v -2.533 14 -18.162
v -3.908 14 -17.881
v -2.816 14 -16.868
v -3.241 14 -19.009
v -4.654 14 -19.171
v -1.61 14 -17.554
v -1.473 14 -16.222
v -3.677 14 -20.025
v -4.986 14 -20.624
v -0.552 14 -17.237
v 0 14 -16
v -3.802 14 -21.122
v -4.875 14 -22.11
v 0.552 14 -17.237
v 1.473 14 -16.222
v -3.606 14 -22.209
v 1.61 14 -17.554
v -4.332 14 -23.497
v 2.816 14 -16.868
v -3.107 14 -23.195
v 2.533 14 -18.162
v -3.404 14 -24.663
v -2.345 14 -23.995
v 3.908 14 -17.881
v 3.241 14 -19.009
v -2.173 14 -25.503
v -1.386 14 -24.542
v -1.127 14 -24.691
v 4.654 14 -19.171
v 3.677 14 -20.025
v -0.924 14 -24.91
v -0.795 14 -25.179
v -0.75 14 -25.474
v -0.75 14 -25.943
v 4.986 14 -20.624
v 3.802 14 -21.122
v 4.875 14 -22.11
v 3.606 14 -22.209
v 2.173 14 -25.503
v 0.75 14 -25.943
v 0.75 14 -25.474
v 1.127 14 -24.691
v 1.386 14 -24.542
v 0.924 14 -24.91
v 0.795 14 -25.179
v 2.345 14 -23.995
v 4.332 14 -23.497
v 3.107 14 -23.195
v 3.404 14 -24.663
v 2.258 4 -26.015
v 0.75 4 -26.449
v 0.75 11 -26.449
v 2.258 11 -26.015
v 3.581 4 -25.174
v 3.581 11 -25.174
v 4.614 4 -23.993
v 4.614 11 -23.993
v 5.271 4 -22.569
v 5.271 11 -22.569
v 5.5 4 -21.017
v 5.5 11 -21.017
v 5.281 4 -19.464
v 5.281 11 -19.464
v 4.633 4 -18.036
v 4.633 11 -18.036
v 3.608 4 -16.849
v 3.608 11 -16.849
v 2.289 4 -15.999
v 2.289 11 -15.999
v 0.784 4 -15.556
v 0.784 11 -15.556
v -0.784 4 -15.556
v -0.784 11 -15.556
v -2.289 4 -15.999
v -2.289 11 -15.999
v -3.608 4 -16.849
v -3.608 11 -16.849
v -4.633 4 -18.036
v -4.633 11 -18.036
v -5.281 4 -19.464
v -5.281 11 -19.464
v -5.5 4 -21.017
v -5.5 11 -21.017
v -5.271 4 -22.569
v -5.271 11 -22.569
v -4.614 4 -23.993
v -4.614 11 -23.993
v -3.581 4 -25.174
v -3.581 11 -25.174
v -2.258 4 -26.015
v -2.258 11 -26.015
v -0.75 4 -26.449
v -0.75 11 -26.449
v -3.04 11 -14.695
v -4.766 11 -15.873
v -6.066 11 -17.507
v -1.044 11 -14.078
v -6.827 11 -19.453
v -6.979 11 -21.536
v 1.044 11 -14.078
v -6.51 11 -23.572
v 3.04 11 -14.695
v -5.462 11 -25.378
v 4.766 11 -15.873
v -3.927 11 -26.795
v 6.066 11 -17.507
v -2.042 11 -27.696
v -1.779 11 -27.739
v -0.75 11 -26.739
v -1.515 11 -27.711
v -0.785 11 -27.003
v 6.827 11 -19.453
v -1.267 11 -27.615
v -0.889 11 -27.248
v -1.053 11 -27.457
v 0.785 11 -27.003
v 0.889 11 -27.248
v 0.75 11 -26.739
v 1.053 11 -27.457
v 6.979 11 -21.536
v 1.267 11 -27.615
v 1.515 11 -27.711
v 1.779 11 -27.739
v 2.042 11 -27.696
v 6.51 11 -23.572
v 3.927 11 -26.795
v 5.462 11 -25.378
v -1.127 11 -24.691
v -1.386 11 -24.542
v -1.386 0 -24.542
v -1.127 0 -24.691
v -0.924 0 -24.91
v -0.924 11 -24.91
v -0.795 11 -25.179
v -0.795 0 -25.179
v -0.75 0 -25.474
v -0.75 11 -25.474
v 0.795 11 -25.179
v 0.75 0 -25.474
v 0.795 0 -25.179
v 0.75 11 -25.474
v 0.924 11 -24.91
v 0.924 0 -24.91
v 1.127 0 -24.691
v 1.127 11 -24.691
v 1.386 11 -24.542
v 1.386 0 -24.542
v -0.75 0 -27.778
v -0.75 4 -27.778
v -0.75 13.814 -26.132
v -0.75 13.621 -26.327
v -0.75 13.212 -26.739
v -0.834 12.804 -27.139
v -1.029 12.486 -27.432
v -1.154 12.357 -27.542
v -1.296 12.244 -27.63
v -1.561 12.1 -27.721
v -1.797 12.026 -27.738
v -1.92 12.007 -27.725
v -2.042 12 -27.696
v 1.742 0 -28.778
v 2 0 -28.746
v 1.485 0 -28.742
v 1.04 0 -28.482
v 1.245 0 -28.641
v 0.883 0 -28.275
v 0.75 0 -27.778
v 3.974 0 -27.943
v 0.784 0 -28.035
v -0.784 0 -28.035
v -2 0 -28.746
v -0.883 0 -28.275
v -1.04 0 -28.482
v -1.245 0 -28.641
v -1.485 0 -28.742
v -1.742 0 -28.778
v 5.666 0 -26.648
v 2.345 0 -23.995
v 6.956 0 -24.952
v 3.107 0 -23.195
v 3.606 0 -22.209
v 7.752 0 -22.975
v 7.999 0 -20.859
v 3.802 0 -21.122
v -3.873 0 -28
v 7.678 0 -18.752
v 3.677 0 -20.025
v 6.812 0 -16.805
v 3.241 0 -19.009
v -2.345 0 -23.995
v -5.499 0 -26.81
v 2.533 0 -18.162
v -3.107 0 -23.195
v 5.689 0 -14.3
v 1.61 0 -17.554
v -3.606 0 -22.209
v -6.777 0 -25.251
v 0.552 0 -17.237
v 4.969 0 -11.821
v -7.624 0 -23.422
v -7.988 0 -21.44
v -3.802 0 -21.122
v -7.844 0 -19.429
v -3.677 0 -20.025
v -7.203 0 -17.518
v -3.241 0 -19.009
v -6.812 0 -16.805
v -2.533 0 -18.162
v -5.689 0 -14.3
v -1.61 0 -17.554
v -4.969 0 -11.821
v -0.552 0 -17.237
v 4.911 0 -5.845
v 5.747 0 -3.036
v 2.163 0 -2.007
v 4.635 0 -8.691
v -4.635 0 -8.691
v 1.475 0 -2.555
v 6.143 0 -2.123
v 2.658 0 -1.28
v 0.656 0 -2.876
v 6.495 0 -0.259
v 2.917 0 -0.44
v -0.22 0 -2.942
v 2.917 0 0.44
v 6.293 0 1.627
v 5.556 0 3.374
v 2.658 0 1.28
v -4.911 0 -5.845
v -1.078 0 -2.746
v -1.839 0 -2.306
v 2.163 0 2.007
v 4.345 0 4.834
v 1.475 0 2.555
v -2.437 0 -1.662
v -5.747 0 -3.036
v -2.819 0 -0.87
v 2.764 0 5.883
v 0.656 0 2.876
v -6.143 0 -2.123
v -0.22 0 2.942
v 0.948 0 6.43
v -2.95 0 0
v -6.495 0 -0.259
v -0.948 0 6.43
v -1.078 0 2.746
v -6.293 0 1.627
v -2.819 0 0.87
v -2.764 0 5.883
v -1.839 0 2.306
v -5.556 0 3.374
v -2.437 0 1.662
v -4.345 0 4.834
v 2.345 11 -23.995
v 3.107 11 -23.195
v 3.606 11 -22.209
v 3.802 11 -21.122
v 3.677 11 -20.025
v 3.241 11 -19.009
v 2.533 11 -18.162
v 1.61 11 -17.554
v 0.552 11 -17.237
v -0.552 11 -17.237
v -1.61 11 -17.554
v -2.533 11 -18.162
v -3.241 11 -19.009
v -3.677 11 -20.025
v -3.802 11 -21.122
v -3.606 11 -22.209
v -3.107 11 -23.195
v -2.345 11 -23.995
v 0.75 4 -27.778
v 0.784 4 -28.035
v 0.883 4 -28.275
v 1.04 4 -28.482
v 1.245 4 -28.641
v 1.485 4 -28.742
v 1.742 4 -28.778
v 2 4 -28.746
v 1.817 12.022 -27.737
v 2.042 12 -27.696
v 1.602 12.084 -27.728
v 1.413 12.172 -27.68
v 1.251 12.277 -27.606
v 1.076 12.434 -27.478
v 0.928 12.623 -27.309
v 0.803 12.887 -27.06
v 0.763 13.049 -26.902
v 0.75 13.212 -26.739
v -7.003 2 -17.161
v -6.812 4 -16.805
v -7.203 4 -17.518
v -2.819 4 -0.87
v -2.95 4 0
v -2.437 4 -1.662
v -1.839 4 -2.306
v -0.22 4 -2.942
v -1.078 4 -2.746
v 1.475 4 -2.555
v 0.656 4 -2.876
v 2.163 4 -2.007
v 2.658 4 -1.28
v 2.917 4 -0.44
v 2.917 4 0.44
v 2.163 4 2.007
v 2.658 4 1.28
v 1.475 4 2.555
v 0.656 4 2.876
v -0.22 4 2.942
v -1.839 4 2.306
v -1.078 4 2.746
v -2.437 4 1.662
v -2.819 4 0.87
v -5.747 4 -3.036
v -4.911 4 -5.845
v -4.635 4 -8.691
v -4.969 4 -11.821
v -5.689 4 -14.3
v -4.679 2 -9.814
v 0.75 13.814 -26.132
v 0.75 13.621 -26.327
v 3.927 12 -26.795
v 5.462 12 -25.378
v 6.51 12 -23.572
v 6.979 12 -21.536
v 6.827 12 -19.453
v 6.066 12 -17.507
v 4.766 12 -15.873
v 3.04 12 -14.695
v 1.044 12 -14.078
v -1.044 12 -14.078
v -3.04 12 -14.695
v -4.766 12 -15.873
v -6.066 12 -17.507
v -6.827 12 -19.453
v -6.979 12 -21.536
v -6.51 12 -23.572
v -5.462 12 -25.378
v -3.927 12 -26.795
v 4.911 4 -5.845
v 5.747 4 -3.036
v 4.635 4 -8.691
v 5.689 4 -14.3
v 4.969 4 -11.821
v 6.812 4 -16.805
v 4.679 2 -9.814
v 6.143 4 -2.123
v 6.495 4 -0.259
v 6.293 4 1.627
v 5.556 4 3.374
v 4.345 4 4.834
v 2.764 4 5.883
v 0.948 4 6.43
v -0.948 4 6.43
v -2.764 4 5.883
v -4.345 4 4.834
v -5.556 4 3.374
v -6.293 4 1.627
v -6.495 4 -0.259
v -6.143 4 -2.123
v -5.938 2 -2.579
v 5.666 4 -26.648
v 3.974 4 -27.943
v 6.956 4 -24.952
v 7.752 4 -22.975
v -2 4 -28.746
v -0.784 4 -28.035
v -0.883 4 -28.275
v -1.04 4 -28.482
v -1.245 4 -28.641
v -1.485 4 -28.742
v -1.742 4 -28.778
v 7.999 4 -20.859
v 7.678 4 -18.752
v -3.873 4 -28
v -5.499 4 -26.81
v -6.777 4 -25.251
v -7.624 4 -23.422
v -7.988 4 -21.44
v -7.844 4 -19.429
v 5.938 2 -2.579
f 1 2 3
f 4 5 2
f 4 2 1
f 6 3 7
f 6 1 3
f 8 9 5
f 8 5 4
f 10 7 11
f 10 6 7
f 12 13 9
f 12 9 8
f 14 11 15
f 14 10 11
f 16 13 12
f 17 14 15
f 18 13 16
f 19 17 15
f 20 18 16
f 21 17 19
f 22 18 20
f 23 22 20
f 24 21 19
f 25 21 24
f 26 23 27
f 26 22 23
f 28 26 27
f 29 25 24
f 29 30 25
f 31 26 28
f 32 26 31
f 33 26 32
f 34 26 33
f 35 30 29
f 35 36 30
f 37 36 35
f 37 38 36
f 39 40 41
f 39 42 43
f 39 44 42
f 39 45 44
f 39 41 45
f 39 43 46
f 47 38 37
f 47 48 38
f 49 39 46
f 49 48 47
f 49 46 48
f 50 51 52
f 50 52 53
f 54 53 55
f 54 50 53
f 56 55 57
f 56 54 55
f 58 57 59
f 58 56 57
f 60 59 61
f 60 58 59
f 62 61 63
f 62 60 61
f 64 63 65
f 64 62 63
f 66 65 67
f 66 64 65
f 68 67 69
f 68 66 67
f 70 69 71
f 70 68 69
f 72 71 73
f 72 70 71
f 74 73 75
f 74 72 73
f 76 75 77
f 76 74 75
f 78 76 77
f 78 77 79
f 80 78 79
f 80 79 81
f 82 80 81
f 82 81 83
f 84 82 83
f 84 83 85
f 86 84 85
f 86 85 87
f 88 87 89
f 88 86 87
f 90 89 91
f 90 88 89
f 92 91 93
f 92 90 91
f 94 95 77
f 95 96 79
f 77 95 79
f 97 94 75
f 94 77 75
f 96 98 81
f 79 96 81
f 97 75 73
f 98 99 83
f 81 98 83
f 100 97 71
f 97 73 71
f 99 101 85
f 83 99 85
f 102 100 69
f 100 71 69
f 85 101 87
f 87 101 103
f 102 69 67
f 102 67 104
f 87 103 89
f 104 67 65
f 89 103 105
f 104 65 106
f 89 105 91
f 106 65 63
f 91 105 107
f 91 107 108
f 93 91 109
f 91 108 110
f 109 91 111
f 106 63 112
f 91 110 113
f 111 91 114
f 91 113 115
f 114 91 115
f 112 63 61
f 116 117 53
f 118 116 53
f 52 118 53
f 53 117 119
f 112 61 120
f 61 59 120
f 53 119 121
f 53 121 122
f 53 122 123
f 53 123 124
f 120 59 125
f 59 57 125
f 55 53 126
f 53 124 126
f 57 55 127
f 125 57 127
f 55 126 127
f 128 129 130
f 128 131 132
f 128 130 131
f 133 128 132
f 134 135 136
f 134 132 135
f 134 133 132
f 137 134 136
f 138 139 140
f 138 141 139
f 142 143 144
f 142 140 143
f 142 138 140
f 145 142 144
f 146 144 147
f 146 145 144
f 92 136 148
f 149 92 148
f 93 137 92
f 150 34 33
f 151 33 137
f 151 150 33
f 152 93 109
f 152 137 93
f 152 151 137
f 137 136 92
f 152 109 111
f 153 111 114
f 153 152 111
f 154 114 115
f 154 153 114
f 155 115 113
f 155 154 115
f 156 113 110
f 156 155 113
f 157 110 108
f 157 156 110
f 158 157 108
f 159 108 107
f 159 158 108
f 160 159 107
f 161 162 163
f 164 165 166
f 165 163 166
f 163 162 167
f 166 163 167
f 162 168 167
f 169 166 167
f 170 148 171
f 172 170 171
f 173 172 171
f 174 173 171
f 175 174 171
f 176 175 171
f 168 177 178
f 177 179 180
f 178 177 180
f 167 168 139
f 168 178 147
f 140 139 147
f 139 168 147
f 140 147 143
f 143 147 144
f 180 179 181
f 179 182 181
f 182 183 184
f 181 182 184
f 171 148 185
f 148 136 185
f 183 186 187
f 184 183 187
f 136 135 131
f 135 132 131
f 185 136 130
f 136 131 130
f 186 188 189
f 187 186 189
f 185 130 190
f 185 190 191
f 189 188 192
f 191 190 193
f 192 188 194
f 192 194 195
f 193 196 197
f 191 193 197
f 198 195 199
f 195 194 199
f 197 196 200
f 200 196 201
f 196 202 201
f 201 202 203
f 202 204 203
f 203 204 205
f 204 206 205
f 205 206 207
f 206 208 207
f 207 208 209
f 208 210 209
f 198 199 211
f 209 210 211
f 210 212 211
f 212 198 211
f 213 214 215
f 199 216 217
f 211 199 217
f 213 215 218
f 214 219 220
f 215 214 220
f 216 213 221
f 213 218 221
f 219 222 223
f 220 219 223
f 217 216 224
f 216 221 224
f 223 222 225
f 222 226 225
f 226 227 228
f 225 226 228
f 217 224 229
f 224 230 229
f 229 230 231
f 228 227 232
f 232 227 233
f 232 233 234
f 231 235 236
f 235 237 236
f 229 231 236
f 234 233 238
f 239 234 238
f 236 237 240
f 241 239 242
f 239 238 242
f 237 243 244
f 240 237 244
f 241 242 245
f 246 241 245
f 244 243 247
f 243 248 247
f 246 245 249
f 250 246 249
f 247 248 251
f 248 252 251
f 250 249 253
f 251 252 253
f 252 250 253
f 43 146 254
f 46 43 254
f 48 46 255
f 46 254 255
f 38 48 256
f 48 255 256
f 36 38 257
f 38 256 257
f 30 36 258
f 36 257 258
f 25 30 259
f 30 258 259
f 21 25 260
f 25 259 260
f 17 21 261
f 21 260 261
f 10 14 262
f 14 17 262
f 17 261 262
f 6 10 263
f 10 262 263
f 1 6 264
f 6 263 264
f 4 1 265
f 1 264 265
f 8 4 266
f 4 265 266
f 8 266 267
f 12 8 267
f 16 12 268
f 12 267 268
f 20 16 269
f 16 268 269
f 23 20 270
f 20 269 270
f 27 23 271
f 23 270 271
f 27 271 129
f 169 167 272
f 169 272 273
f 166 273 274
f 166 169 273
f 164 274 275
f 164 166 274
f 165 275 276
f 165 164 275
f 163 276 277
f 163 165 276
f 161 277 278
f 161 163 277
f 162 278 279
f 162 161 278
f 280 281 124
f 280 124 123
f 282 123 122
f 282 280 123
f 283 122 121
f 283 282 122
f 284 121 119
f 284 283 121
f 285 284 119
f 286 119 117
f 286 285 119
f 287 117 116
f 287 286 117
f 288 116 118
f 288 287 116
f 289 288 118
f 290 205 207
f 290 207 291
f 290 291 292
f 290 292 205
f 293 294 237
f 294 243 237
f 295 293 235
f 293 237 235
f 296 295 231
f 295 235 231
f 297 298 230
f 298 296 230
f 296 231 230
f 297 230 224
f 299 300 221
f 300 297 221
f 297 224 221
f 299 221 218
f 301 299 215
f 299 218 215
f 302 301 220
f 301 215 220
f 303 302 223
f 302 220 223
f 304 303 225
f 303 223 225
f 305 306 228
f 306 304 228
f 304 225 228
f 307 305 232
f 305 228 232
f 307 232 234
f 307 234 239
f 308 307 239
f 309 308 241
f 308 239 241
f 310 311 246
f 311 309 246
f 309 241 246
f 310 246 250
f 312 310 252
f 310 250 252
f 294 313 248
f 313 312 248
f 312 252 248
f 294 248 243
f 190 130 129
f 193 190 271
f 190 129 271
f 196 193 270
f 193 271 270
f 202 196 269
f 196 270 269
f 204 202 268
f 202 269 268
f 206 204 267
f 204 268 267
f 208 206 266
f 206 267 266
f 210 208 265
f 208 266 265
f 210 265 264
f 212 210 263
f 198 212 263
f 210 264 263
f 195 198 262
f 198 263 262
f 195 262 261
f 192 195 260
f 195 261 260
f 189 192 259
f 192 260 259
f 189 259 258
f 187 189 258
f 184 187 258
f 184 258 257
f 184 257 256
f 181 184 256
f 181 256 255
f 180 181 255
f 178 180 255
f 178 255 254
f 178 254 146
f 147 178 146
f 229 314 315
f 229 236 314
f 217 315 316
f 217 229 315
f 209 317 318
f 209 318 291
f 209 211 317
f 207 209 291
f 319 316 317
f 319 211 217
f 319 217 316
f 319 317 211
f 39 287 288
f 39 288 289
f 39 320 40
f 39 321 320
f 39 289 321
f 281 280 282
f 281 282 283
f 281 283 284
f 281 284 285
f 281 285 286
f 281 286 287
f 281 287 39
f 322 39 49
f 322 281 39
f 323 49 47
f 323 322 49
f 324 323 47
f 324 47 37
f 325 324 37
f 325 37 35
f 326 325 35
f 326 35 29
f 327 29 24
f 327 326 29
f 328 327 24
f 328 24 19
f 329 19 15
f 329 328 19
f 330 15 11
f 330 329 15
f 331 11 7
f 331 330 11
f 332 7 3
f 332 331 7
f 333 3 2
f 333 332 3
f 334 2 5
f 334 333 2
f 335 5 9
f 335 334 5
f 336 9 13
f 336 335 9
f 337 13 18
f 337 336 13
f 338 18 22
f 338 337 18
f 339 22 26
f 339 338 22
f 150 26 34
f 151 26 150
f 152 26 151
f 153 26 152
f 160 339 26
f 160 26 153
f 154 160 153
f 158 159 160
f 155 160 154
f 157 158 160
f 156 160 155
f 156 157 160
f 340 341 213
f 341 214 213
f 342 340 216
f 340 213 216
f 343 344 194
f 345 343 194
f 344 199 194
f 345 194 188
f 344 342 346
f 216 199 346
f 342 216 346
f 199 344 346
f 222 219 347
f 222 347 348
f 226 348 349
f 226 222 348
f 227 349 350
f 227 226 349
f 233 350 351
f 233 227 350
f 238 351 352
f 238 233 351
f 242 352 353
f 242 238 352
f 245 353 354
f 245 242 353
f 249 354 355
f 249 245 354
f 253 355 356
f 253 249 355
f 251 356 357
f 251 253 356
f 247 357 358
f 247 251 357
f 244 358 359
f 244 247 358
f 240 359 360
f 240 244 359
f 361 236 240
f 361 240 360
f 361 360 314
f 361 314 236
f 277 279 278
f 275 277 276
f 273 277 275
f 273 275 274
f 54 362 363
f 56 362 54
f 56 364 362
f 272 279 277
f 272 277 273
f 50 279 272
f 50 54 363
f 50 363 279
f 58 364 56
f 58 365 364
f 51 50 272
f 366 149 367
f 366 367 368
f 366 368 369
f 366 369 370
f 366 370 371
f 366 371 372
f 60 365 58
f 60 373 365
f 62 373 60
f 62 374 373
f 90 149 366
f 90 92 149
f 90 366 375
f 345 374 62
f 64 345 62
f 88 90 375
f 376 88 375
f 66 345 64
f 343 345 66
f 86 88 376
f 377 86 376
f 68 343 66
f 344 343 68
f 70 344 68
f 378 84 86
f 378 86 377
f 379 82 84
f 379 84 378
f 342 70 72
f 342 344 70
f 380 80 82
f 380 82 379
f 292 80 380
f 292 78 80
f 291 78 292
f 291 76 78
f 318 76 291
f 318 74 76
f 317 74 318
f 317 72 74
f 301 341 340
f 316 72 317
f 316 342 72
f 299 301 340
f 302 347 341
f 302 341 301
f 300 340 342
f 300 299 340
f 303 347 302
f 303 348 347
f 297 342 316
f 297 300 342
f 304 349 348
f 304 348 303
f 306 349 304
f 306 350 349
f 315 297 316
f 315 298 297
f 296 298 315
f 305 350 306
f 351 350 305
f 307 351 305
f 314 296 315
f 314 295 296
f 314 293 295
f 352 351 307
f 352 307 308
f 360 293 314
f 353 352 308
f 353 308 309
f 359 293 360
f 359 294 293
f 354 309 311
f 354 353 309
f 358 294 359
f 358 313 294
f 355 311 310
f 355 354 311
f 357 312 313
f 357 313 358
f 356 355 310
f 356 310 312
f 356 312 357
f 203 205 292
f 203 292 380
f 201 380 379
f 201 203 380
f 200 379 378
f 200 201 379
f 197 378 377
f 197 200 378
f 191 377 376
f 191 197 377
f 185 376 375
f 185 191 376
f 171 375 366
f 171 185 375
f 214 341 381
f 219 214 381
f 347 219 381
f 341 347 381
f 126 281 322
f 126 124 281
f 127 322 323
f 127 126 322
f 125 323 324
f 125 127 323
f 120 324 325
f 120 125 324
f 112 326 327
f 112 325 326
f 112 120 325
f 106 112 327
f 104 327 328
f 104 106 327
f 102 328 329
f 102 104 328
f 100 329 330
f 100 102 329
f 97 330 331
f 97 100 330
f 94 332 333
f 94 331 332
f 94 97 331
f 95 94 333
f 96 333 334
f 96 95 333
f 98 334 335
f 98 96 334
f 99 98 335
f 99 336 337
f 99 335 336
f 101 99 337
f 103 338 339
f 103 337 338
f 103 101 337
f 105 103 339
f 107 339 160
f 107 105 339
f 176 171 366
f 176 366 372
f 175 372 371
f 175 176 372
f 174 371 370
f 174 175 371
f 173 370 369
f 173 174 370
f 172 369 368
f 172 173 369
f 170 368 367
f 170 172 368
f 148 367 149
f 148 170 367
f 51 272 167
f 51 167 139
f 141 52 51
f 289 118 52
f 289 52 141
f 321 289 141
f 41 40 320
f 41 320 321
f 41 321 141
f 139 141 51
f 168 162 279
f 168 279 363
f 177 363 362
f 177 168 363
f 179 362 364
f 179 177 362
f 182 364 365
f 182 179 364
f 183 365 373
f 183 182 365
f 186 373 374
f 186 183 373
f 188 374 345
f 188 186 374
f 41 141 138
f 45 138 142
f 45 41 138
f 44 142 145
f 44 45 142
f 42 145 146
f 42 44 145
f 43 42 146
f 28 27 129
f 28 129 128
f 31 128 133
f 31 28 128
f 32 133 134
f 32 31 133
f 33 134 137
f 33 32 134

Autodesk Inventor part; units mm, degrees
ref_plane "YZ Plane" through (0, 0, 0) normal (1, 0, 0) x (0, 1, 0)
ref_plane "XZ Plane" through (0, 0, 0) normal (0, 1, 0) x (-1, 0, 0)
ref_plane "XY Plane" through (0, 0, 0) normal (0, 0, 1) x (1, 0, 0)
sketch "Sketch1" plane through (0, 0, 0) normal (0, 1, 0) x (-1, 0, 0)
  circle A0 centre (0, 0) radius 2.95
  circle A1 centre (0, 0) radius 6.5
  circle A2 centre (0, -21) radius 8
  spline S0 degree 2 poles (6.1434, -2.1233) (2.6668, -9.5534) (7.2026, -17.5183) knots 0 0 0 1 1 1
  line L0 (0, 0) -> (0, -21) construction
  spline S1 degree 2 poles (-6.1434, -2.1233) (-2.6668, -9.5534) (-7.2026, -17.5183) knots 0 0 0 1 1 1
  point P0 (4.6554, -9.4486)
  point P1 (-4.6554, -9.4486)
  point P2 (-6.1434, -2.1233)
  point P3 (-6.812, -16.8052)
  dimension "d1" = 13
  dimension "d2" = 16
  dimension "d0" = 5.9
  dimension "d3" = 21
extrude "Extrusion1" add sketch "Sketch1" along normal blind 4 contours A1 S0 S1 | A1 S0 A2 S1 | S1 A2 | A2 S0 S1
sketch "Sketch2" plane through (0, 4, 0) normal (0, 1, 0) x (1, 0, 0)
  arc A0 (6.812, 16.8052) -> (-7.2026, 17.5183) centre (0, 21) ccw projected
  arc A1 (-6.1434, 2.1233) -> (6.1434, 2.1233) centre (0, 0) ccw projected
  circle A2 centre (0, 0) radius 2.95 projected
  circle A3 centre (0, 21) radius 5.5
  line L0 (0.75, 12.2819) -> (-0.75, 12.2819)
  line L1 (-0.75, 12.2819) -> (-0.75, 29.7181)
  line L2 (-0.75, 29.7181) -> (0.75, 29.7181)
  line L3 (0.75, 29.7181) -> (0.75, 12.2819)
  line L4 (0.75, 12.2819) -> (-0.75, 29.7181) construction
  line L5 (-0.75, 12.2819) -> (0.75, 29.7181) construction
  circle A4 centre (0, 21) radius 3.8038
  point P0 (0.75, 26.4486)
  point P1 (0.75, 15.5514)
  point P2 (-0.75, 15.5514)
  point P3 (-0.75, 26.4486)
  point P4 (-0.75, 24.7291)
  point P5 (0.75, 24.7291)
  dimension "d6" = 11
  dimension "d7" = 1.5
extrude "Extrusion2" cut sketch "Sketch2" against normal blind 5 contours L3 A3 L1 A0 | A0 L1 L2 L3 | L3 A4 L1 A3 | A4 L3 | L3 A4 L1 | L1 A4 picked at (-0.5838, 25.3244)
extrude "Extrusion3" add sketch "Sketch2" along normal blind 7 contours A3 L3 A4 | L1 A4 A3 | L1 A4 L3 A3 picked at (-0.5838, 16.6756)
sketch "Sketch4" plane through (0, 11, 0) normal (0, 1, 0) x (1, 0, 0)
  line L0 (-0.75, 24.7291) -> (-0.75, 26.4486) projected
  arc A0 (-0.75, 26.4486) -> (0.75, 26.4486) centre (0, 21) ccw projected
  line L1 (0.75, 26.4486) -> (0.75, 24.7291) projected
  arc A1 (-0.75, 24.7291) -> (0.75, 24.7291) centre (0, 21) ccw projected
  circle A2 centre (0, 21) radius 5.5 projected
  circle A3 centre (0, 21) radius 3.8038 projected
  circle A4 centre (0, 21) radius 7
  line L2 (-0.75, 12.2819) -> (-0.75, 29.7181) projected
  line L3 (0.75, 29.7181) -> (0.75, 12.2819) projected
  point P0 (0, 0)
  point P1 (0.75, 27.9597)
  point P2 (-0.75, 27.9597)
  dimension "d12" = 1.5
extrude "Extrusion4" add sketch "Sketch4" along normal blind 3 contours A1 L2 A0 L0 | A0 L2 A4 | A1 L3 A0 L2 | L1 A0 L3 A1 | A0 L3 A4 L2 | L3 A4 A0
chamfer "Chamfer1" distance 2 angle 45 1 edges at (0, 14, -14)
fillet "Fillet1" radius 1 8 edges at (0.75, 2, -28.9648) (-0.75, 2, -28.9648) (0.75, 12.5, -24.7291) (0.75, 2, -24.7291) (-0.75, 12.5, -24.7291) (-0.75, 2, -24.7291) (0.75, 11.5, -27.9597) (-0.75, 11.5, -27.9597)
properties part number "Servo_Pulley"
